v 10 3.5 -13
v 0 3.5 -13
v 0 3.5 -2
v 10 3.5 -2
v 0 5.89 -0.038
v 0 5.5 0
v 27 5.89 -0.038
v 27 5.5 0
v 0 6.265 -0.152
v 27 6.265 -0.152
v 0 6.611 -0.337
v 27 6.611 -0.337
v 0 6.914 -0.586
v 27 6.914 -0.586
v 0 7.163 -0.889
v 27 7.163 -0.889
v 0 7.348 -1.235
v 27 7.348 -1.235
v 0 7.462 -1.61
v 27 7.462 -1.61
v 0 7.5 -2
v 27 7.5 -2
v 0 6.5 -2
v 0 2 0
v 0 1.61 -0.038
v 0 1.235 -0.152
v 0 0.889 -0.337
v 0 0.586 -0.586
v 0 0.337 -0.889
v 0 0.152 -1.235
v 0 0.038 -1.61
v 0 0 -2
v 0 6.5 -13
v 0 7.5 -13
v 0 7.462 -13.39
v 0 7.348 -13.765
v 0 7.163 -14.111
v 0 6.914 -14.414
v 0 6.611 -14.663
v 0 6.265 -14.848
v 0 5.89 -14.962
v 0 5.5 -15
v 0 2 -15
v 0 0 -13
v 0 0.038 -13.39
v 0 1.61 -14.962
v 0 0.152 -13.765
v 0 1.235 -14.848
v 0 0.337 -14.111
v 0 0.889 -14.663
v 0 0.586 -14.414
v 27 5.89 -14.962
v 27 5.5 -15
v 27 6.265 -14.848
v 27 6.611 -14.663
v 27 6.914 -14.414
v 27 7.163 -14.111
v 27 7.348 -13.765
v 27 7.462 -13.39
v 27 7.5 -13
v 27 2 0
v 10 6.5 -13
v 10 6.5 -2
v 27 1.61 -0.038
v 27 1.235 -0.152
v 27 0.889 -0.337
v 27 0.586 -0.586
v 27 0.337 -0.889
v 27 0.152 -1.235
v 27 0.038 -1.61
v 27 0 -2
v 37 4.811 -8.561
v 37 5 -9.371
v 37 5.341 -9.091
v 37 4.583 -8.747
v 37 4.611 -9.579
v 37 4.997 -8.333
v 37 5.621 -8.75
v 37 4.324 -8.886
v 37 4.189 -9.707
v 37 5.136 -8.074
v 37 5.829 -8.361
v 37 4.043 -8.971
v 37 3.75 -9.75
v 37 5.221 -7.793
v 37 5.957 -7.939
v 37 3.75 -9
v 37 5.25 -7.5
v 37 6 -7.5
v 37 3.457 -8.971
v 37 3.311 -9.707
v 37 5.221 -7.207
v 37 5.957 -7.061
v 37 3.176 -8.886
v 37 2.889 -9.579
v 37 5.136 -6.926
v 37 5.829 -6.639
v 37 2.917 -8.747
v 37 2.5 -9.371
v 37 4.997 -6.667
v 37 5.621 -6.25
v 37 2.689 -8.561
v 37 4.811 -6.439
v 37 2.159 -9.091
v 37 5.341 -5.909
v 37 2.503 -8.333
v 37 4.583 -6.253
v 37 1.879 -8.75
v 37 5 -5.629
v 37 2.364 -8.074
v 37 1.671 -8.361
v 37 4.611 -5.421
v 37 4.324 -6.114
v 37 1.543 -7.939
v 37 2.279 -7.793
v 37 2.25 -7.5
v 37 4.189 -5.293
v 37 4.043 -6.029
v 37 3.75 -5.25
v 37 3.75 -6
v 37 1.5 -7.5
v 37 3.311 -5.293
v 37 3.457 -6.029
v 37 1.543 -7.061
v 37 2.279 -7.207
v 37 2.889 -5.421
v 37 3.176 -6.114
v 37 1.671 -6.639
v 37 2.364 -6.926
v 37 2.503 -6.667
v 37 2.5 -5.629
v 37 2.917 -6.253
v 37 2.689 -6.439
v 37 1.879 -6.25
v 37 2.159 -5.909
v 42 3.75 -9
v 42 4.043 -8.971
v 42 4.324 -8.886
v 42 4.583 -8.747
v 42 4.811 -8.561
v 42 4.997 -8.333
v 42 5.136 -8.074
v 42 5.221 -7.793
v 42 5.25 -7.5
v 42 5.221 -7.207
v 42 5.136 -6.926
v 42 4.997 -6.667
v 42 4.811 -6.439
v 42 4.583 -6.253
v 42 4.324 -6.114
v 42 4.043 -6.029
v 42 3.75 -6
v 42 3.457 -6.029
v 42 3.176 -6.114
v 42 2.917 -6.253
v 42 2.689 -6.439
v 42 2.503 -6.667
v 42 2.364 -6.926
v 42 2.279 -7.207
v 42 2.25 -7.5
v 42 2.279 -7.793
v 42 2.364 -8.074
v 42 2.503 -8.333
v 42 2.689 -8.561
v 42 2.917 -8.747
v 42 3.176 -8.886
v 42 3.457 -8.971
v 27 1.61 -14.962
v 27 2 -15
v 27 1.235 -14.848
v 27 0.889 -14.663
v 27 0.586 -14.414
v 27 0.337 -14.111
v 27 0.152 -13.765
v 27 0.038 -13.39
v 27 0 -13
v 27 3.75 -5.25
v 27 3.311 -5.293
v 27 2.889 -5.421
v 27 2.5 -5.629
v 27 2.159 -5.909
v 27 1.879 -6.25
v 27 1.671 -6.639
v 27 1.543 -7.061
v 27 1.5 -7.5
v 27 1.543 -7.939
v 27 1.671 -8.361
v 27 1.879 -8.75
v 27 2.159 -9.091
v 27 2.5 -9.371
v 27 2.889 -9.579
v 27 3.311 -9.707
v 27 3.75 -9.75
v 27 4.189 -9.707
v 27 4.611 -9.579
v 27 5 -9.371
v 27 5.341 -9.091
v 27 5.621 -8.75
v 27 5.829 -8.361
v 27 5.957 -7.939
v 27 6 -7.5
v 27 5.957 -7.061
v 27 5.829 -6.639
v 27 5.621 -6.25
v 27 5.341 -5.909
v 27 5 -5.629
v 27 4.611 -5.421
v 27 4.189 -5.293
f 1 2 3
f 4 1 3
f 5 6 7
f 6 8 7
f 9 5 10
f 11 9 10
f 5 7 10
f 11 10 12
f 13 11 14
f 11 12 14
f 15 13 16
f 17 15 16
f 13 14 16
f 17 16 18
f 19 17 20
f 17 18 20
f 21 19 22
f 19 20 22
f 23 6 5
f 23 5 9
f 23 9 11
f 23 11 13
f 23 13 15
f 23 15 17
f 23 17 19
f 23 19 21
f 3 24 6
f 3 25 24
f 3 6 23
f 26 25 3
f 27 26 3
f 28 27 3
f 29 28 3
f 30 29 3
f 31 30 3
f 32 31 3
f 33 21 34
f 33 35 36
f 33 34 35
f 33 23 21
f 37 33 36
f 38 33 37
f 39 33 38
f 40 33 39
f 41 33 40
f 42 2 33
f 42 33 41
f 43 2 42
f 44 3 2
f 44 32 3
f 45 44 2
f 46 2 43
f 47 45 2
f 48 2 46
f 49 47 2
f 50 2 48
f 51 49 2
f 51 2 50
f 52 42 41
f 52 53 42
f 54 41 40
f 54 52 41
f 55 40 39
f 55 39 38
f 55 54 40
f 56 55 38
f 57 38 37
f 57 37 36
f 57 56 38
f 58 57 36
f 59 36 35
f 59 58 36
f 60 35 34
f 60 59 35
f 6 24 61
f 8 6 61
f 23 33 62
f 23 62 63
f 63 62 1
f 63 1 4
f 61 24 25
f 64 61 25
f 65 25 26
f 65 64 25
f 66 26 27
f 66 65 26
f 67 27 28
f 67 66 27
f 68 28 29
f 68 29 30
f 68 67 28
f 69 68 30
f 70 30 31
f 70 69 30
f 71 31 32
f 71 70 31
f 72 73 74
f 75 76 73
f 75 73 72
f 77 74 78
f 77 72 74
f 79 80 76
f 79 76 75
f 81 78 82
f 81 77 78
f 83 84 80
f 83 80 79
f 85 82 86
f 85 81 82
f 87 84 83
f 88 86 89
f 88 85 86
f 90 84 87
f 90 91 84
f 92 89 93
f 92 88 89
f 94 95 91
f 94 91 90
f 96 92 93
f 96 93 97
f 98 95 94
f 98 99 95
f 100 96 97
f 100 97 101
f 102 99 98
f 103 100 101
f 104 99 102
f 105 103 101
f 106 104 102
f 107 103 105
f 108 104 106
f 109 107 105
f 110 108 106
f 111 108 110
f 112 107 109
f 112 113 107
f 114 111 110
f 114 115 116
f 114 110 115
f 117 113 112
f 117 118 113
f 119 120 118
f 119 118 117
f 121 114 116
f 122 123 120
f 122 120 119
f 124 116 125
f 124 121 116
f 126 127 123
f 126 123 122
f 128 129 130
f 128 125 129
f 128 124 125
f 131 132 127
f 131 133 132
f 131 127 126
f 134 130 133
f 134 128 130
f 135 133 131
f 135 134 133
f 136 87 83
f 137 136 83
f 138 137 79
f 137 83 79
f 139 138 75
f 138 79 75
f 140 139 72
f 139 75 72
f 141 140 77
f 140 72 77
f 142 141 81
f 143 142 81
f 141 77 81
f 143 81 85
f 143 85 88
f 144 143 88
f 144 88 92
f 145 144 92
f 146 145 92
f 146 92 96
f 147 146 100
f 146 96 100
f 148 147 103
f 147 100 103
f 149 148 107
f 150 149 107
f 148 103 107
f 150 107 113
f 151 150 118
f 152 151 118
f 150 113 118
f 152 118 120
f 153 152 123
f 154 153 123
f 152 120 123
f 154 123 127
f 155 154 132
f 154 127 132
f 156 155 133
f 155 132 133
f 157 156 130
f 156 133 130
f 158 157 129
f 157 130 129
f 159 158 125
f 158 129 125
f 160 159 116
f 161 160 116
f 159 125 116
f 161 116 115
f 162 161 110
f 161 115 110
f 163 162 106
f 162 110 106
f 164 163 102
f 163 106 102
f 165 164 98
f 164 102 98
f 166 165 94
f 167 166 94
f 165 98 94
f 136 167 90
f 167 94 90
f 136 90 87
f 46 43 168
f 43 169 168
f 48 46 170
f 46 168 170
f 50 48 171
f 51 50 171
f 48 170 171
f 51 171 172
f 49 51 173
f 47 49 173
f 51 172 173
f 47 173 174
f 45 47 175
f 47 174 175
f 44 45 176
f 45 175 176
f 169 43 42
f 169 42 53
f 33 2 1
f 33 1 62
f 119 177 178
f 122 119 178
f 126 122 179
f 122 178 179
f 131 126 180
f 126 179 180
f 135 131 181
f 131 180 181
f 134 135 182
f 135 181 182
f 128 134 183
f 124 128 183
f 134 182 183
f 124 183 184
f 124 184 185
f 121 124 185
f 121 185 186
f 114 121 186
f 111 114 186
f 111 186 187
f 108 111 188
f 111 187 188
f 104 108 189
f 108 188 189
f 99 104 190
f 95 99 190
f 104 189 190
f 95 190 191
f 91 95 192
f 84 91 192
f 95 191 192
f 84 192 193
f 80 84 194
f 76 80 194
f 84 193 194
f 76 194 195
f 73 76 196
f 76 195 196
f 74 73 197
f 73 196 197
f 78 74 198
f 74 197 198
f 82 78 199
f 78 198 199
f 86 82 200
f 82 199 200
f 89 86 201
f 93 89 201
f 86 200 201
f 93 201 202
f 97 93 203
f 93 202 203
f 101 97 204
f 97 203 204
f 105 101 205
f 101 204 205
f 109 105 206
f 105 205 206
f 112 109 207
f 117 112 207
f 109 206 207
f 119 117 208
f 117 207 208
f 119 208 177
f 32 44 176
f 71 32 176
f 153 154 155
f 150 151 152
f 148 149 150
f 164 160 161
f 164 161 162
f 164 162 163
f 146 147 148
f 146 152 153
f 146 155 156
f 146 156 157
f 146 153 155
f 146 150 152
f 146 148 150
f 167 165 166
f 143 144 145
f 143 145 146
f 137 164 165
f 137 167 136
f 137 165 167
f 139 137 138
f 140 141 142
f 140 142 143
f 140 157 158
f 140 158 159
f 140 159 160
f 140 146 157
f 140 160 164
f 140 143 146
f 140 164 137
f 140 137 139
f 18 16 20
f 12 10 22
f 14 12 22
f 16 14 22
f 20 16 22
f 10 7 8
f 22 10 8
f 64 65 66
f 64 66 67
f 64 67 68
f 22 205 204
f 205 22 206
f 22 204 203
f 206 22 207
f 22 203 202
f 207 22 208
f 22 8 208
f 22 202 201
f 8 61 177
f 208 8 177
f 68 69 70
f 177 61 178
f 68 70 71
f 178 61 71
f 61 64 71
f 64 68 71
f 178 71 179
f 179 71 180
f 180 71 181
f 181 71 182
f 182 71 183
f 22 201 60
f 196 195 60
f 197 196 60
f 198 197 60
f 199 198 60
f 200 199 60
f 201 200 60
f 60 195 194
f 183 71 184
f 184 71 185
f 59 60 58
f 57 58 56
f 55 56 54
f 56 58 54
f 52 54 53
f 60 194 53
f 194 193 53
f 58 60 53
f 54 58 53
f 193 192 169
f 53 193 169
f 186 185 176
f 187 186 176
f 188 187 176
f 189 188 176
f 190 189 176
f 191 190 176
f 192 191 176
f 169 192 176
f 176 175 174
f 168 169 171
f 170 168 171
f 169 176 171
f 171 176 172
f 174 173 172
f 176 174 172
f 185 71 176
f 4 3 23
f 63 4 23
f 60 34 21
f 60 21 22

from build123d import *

# Parameters (mm, degrees)
SKETCH_1_W          = 27
SKETCH_1_H          = 15
EXTRUDE_1_DEPTH     = 7.5
SKETCH_2_R          = 2.25
EXTRUDE_2_DEPTH     = 10
SKETCH_3_R          = 1.5
EXTRUDE_3_DEPTH     = 5
FILLET_1_R          = 2
SKETCH_4_W          = 11
SKETCH_4_H          = 3
CUT_EXTRUDE_1_DEPTH = 10


with BuildPart() as part:
    # Эскиз1 → Бобышка-Вытянуть1 (new body)
    with BuildSketch(Plane(origin=(0, 0, 0), x_dir=(1, 0, 0), z_dir=(0, 1, 0))):
        with Locations((13.5, 7.5)):
            Rectangle(SKETCH_1_W, SKETCH_1_H)
    extrude(amount=EXTRUDE_1_DEPTH)

    # Эскиз2 → Бобышка-Вытянуть2 (add)
    with BuildSketch(Plane(origin=(27, 0, 0), x_dir=(0, 0, -1), z_dir=(1, 0, 0))):
        with Locations(Location((7.5, 3.75, 0), (0, 0, 180))):
            Circle(SKETCH_2_R)
    extrude(amount=EXTRUDE_2_DEPTH)

    # Эскиз3 → Бобышка-Вытянуть3 (add)
    with BuildSketch(Plane(origin=(37, 0, 0), x_dir=(0, 0, -1), z_dir=(1, 0, 0))):
        with Locations((7.5, 3.75)):
            Circle(SKETCH_3_R)
    extrude(amount=EXTRUDE_3_DEPTH)

    # Скругление1
    fillet_1_edges = [part.edges().sort_by_distance(p)[0] for p in [
        (13.5, 7.5, -15),
        (13.5, 7.5, 0),
        (13.5, 0, -15),
        (13.5, 0, 0),
    ]]
    fillet(fillet_1_edges, radius=FILLET_1_R)

    # Эскиз4 → Вырез-Вытянуть1 (cut)
    with BuildSketch(Plane.ZY):
        with Locations((-7.5, 5)):
            Rectangle(SKETCH_4_W, SKETCH_4_H)
    extrude(amount=-CUT_EXTRUDE_1_DEPTH, mode=Mode.SUBTRACT)


solid = part.part
